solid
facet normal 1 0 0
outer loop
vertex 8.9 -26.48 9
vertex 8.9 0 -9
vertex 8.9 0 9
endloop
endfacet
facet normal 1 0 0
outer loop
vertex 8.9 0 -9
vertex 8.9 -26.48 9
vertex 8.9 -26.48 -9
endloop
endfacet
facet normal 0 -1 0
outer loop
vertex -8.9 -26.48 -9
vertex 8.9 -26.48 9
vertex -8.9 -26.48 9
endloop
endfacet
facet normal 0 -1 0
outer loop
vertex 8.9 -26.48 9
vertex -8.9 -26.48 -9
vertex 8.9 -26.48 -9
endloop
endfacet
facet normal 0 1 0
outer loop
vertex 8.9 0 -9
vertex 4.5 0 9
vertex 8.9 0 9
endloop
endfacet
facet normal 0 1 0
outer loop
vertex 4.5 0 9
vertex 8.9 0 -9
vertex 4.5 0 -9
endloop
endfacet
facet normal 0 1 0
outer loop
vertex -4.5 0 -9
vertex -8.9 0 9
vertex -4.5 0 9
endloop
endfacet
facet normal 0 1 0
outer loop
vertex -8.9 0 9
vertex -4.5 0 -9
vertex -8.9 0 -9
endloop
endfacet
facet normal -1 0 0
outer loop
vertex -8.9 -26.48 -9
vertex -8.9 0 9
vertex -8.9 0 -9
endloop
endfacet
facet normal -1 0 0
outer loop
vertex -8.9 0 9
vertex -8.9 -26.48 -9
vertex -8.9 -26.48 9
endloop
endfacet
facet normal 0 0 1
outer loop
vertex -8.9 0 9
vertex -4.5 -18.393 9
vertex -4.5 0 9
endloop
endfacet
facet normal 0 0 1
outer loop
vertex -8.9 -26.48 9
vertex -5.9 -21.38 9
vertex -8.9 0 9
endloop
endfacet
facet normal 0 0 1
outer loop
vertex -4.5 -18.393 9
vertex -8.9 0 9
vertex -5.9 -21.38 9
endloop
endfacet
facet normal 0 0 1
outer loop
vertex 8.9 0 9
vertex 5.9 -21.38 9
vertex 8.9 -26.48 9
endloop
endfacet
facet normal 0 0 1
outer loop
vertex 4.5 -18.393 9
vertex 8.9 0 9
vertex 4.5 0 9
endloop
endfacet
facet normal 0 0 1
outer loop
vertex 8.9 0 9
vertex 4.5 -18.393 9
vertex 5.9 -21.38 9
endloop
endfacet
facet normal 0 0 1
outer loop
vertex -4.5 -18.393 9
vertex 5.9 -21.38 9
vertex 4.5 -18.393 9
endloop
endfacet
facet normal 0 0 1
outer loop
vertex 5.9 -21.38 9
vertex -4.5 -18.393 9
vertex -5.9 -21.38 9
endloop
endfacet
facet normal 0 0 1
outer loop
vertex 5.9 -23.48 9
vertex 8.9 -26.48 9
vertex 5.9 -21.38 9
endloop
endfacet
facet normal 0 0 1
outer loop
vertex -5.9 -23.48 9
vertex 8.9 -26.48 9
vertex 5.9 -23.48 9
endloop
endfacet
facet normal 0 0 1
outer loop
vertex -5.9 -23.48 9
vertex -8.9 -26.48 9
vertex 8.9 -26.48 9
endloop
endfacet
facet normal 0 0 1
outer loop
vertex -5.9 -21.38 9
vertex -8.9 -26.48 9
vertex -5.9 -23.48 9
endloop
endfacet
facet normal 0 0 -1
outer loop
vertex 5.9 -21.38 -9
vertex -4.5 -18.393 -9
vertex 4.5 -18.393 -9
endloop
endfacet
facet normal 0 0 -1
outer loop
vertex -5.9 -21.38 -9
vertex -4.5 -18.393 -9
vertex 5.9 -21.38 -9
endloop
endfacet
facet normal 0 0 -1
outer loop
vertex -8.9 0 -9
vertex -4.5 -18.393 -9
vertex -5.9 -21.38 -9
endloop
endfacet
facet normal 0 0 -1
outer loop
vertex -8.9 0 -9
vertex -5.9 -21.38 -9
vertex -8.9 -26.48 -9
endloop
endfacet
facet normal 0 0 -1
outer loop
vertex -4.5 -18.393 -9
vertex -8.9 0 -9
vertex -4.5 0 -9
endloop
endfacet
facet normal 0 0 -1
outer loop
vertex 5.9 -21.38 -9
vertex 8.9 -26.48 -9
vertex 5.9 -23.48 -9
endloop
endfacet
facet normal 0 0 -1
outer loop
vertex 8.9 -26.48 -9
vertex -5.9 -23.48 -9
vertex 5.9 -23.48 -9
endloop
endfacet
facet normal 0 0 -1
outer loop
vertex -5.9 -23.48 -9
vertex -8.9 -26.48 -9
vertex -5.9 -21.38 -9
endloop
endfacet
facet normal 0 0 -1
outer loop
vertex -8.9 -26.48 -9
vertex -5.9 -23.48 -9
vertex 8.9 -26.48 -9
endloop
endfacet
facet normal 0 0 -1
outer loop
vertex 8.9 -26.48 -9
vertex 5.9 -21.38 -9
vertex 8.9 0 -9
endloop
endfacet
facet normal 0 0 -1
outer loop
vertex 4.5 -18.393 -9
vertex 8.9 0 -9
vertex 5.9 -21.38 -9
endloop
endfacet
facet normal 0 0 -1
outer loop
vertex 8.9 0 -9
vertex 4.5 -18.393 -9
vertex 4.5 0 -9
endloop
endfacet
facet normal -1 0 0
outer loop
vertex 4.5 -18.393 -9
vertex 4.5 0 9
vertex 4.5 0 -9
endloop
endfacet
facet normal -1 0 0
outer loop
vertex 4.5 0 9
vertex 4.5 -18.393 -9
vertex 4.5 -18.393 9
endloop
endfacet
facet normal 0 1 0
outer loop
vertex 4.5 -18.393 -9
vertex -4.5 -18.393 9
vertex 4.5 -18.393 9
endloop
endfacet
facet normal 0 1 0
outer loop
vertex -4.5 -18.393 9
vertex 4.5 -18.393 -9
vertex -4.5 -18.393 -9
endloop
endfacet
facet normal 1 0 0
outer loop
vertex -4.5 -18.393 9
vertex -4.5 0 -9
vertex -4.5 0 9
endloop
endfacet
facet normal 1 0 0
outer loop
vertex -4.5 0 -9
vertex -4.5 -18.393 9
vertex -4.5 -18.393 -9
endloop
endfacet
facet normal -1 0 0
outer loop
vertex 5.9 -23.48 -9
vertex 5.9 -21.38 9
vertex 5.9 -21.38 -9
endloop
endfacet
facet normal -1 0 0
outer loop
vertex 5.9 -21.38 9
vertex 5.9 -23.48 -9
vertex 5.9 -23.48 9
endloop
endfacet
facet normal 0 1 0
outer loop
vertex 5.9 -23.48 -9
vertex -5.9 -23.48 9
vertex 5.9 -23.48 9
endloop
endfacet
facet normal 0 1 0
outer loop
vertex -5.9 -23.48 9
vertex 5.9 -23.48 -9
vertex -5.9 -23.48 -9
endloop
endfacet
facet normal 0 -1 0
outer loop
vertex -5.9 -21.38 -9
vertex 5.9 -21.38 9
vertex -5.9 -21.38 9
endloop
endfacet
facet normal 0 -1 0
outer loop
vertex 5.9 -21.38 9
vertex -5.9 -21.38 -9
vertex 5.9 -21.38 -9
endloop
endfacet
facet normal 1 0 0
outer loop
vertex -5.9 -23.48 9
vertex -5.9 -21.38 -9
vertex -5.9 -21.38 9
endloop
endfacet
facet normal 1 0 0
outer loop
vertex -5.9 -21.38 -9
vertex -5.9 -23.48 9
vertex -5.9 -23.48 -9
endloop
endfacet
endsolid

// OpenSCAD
echo(version=version());


w1 = 9.0;
w2 = 11.8;

wall = 3;
divider = 2.1;
h = 18.38 + 2*wall+divider;

d = 18;


module example_intersection()
{
	/*intersection() {
		difference() {
			union() {
				cube([30, 30, 30], center = true);
				translate([0, 0, -25])
					cube([15, 15, 50], center = true);
			}
			union() {
				cube([50, 10, 10], center = true);
				cube([10, 50, 10], center = true);
				cube([10, 10, 50], center = true);
			}
		}
		translate([0, 0, 5])
			cylinder(h = 50, r1 = 20, r2 = 5, center = true);
	}*/
    
    rotate([90])
		difference() {
				translate([0, 0, h/2])
					cube([w2 + 2*wall, d, h], center = true);
				translate([0, 0, (h - wall * 2 - divider) / 2])
					cube([w1, d * 1.001, h * 1.001 - wall * 2 - divider], center = true);
				translate([0, 0, h - divider / 2 - wall])
					cube([w2 , d * 1.001, divider], center = true);
		}
}

example_intersection();
